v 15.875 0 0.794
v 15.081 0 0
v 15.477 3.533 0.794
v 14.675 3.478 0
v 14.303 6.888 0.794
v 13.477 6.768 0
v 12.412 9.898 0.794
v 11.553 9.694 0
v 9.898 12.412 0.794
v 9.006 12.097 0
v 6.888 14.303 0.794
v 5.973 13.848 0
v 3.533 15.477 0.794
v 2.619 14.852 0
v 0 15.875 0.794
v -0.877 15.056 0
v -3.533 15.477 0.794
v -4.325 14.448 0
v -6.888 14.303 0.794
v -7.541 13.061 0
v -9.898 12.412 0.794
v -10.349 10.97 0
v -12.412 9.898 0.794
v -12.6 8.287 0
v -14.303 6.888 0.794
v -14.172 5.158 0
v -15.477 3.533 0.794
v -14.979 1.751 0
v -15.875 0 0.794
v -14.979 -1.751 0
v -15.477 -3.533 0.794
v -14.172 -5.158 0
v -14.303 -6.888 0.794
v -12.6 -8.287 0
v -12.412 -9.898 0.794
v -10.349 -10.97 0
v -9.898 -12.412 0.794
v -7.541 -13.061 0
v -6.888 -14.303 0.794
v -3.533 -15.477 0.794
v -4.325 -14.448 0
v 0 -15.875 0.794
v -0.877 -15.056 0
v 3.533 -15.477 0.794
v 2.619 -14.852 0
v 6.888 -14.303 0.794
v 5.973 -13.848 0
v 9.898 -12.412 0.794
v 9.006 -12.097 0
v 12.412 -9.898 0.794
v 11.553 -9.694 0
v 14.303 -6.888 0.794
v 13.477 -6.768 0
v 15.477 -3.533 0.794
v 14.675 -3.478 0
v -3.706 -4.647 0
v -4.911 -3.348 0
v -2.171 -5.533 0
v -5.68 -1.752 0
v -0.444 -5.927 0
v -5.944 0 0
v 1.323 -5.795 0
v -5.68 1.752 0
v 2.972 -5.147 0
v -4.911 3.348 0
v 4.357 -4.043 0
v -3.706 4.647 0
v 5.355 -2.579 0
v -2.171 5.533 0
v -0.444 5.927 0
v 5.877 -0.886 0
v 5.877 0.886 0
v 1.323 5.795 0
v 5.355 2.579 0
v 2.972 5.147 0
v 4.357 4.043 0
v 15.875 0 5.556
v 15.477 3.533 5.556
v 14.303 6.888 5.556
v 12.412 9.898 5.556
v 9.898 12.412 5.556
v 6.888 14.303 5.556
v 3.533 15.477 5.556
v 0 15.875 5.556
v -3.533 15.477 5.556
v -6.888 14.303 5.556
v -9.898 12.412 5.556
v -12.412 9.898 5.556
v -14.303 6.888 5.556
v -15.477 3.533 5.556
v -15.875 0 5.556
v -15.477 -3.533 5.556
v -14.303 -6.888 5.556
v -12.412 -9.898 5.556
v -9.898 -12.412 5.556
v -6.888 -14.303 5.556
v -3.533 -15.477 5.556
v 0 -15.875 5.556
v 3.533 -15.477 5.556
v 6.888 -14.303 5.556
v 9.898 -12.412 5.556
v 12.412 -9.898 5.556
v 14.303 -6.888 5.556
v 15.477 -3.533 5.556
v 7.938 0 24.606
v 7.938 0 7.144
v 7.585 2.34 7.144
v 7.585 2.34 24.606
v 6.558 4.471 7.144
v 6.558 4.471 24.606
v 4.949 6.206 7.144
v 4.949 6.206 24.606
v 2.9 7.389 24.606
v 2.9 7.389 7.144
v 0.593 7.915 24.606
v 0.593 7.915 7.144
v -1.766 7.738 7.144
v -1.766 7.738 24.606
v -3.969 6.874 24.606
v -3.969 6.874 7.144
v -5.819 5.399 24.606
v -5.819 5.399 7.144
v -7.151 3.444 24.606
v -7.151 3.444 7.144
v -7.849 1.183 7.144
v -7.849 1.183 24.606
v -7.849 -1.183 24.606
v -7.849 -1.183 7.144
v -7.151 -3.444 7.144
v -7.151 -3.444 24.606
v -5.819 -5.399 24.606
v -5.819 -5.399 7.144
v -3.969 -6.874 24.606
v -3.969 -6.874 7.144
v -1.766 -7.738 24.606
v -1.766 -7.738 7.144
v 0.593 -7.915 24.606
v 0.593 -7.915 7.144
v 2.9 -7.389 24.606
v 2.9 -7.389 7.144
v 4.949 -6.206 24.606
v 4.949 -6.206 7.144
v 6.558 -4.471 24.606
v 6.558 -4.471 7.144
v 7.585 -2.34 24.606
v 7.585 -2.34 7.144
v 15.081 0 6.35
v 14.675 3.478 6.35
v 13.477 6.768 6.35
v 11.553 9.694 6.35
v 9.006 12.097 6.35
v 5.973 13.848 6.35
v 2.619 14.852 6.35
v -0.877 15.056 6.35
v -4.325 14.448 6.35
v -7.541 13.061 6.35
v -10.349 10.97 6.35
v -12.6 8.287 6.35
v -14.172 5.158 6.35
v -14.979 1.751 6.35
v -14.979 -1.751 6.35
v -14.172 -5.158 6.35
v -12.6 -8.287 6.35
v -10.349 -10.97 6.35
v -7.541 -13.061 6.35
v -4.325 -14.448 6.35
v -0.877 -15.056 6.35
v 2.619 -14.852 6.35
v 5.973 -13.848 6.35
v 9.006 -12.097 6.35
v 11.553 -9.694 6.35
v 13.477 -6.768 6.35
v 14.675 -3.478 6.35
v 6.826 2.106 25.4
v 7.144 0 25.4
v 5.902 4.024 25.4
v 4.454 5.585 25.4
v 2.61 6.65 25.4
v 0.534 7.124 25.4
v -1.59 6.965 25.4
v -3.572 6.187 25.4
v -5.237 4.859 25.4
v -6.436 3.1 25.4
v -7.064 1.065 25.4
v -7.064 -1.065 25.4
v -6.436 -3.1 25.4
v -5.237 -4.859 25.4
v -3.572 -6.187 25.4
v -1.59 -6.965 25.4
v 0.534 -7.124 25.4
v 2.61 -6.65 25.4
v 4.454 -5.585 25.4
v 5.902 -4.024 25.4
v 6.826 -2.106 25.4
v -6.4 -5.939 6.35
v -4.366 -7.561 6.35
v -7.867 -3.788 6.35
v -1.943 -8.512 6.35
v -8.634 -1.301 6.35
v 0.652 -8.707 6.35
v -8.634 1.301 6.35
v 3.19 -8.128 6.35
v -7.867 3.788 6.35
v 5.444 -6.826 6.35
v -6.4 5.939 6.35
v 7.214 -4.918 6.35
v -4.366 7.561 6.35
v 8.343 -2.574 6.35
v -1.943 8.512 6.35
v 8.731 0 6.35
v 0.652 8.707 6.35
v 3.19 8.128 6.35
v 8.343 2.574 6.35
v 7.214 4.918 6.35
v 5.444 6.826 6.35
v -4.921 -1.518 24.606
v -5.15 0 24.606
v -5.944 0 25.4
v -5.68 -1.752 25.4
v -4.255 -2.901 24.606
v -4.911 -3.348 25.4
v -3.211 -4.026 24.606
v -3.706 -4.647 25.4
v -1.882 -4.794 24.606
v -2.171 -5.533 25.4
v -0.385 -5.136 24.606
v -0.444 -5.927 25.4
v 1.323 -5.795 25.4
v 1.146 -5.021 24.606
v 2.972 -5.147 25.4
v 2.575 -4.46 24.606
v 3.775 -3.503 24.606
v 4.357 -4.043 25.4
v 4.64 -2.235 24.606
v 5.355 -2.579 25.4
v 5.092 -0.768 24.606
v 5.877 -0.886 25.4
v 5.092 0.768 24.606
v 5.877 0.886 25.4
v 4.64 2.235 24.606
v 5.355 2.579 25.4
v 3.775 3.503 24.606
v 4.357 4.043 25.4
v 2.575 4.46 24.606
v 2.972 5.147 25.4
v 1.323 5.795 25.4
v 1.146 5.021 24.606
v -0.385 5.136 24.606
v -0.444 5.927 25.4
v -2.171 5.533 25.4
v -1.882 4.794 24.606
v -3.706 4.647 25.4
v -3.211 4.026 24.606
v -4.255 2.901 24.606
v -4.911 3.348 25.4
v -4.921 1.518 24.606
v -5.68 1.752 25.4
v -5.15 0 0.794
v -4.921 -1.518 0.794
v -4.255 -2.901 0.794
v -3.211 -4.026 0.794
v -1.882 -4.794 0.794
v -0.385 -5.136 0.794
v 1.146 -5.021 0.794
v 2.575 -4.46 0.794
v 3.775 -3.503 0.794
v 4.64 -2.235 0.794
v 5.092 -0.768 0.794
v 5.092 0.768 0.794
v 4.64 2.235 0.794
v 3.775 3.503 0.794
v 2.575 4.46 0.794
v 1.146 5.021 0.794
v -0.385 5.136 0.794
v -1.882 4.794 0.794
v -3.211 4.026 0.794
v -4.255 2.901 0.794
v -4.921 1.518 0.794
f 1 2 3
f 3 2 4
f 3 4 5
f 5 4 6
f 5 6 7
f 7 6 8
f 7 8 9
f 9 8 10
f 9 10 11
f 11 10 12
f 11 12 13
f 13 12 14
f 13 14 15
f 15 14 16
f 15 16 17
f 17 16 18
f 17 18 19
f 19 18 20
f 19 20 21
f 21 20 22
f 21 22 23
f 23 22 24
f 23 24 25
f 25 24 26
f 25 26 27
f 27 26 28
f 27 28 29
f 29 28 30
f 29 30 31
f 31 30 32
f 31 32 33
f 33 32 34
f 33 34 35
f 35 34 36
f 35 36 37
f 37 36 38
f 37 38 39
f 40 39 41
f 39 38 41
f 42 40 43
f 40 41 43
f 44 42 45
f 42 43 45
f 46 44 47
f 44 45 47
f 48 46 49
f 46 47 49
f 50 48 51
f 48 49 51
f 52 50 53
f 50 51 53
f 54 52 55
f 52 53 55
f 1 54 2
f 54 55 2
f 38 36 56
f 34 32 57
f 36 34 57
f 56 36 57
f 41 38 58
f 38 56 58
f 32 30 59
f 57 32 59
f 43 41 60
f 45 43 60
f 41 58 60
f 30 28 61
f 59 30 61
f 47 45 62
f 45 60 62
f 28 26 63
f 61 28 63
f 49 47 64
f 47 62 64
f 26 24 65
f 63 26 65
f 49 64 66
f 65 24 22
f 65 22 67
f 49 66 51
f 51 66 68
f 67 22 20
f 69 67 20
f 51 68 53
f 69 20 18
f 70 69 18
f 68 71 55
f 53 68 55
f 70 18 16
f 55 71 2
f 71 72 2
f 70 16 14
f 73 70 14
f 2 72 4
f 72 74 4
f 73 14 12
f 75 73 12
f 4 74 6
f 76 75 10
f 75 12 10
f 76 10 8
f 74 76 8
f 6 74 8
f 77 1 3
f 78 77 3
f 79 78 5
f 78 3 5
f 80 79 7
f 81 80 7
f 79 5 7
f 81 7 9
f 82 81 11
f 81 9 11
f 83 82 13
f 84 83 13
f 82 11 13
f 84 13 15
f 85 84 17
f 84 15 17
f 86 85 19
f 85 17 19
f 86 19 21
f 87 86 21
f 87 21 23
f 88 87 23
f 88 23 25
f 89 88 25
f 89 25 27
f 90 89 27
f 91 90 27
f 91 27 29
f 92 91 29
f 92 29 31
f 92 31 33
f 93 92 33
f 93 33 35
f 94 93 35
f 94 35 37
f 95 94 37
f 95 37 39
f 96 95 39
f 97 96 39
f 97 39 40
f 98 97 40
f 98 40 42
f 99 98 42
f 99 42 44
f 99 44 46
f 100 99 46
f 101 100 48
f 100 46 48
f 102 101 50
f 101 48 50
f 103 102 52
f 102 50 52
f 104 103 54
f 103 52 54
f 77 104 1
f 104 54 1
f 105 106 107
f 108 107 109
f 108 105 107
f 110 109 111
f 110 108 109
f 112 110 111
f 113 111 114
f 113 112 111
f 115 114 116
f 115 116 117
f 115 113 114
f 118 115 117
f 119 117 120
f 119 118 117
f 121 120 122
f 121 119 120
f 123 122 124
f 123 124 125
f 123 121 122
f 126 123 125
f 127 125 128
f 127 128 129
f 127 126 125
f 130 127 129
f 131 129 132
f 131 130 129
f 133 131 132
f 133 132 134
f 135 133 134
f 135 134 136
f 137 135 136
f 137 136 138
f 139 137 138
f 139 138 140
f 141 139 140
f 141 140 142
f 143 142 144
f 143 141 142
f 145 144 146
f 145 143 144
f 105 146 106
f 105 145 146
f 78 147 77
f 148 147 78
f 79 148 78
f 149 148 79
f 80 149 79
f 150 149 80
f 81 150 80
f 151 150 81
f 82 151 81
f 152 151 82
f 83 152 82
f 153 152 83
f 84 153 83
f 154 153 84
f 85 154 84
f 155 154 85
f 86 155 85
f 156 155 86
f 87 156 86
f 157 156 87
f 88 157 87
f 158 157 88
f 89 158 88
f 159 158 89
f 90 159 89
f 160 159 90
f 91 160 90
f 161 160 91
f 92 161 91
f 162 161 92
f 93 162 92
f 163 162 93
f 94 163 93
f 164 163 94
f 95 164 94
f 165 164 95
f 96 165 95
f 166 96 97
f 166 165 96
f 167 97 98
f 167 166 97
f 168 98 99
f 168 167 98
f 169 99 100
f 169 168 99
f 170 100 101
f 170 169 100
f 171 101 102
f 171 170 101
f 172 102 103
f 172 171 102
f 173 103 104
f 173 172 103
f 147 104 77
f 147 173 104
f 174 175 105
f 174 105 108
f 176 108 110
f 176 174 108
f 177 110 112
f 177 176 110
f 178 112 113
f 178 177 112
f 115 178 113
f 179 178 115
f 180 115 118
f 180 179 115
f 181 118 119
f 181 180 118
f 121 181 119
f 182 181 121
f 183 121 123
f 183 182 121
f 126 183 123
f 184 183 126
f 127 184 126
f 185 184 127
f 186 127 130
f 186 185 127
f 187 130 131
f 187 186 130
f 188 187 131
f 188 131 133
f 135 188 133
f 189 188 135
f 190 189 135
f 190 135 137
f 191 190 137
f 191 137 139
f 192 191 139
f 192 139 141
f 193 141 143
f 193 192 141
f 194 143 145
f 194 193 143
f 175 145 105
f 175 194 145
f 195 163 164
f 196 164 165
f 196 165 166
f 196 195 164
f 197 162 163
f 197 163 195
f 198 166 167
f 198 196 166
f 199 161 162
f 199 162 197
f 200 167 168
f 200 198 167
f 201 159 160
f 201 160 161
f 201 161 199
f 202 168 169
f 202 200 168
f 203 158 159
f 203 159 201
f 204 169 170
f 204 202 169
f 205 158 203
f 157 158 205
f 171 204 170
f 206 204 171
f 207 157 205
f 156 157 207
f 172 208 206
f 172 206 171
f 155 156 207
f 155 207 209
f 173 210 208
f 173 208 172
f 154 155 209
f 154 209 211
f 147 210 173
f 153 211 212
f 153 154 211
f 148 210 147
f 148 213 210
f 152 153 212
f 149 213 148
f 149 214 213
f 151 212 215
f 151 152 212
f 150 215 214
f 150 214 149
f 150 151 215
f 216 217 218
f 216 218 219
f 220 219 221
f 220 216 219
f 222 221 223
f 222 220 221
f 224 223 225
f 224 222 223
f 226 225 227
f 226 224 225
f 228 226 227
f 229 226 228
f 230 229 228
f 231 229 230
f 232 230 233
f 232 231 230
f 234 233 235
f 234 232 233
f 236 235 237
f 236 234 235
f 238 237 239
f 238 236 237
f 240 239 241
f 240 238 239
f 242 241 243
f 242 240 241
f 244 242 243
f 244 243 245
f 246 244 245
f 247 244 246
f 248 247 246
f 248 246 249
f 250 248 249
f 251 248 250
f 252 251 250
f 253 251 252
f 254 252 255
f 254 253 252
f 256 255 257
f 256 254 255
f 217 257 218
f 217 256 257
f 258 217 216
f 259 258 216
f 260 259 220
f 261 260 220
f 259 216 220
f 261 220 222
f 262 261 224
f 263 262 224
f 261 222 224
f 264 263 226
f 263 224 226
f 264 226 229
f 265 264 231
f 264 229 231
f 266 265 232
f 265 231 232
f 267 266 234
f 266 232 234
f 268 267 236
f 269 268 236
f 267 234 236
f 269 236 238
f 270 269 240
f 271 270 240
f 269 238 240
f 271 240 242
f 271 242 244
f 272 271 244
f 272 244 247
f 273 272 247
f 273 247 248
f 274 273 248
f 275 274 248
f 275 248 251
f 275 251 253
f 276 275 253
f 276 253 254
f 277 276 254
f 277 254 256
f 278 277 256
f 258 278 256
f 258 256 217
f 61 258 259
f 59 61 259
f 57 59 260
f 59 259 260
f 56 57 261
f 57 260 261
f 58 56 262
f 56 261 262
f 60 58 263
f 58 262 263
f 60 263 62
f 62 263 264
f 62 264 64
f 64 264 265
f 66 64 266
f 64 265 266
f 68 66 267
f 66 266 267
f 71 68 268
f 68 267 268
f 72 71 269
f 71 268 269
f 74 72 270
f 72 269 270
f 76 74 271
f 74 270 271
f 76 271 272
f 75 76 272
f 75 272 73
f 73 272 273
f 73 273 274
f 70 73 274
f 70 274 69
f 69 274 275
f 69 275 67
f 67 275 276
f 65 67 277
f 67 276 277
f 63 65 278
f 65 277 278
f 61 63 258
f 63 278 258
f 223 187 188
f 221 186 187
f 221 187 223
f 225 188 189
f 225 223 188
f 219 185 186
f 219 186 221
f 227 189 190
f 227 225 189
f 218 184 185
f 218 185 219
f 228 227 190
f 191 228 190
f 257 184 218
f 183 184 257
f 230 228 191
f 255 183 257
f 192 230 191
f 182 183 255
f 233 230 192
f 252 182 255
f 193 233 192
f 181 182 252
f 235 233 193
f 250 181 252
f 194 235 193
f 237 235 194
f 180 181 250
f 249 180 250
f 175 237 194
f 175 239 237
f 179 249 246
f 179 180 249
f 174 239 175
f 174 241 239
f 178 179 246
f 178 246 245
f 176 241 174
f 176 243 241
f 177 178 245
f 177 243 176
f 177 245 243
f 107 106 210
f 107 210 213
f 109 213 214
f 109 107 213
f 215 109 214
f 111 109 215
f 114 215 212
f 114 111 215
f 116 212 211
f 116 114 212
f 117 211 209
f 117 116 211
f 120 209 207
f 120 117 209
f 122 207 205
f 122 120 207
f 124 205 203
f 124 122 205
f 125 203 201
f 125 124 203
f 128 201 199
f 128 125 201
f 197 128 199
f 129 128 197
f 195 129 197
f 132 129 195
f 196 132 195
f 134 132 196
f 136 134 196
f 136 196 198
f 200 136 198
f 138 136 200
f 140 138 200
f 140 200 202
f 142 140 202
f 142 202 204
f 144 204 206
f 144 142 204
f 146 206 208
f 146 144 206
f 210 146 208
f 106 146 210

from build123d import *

# Parameters (mm, degrees)
F0_R     = 15.875
F1_DEPTH = 25.4
F2_D     = 10.3
F3_SIZE  = 0.79375
F4_SIZE  = 0.79375
F5_R     = 15.875
F5_R_2   = 7.9375
F6_DEPTH = 19.05
F7_SIZE  = 0.79375


with BuildPart() as f1:
    # F0 (on Top) → F1 (new body)
    with BuildSketch(Plane.XY):
        Circle(F0_R)
    extrude(amount=F1_DEPTH)

    # F2 (through all)
    with Locations(Plane(origin=(0, 0, 0), x_dir=(1, 0, 0), z_dir=(0, 0, -1))):
        with Locations((0, 0)):
            Hole(F2_D / 2)

    # F3
    f3_edges = [f1.edges().sort_by_distance(p)[0] for p in [
        (-15.875, 0, 0),
    ]]
    chamfer(f3_edges, length=F3_SIZE)

    # F4
    f4_edges = [f1.edges().sort_by_distance(p)[0] for p in [
        (-15.875, 0, 25.4),
        (-5.15, 0, 25.4),
        (-5.15, 0, 0),
    ]]
    chamfer(f4_edges, length=F4_SIZE)

    # F5 (on face) → F6 (cut)
    with BuildSketch(Plane.XY.offset(25.4)):
        Circle(F5_R)
        Circle(F5_R_2, mode=Mode.SUBTRACT)
    extrude(amount=-F6_DEPTH, mode=Mode.SUBTRACT)

    # F7
    f7_edges = [f1.edges().sort_by_distance(p)[0] for p in [
        (-15.875, 0, 6.35),
        (-7.9375, 0, 6.35),
        (-7.9375, 0, 25.4),
    ]]
    chamfer(f7_edges, length=F7_SIZE)


solid = f1.part
